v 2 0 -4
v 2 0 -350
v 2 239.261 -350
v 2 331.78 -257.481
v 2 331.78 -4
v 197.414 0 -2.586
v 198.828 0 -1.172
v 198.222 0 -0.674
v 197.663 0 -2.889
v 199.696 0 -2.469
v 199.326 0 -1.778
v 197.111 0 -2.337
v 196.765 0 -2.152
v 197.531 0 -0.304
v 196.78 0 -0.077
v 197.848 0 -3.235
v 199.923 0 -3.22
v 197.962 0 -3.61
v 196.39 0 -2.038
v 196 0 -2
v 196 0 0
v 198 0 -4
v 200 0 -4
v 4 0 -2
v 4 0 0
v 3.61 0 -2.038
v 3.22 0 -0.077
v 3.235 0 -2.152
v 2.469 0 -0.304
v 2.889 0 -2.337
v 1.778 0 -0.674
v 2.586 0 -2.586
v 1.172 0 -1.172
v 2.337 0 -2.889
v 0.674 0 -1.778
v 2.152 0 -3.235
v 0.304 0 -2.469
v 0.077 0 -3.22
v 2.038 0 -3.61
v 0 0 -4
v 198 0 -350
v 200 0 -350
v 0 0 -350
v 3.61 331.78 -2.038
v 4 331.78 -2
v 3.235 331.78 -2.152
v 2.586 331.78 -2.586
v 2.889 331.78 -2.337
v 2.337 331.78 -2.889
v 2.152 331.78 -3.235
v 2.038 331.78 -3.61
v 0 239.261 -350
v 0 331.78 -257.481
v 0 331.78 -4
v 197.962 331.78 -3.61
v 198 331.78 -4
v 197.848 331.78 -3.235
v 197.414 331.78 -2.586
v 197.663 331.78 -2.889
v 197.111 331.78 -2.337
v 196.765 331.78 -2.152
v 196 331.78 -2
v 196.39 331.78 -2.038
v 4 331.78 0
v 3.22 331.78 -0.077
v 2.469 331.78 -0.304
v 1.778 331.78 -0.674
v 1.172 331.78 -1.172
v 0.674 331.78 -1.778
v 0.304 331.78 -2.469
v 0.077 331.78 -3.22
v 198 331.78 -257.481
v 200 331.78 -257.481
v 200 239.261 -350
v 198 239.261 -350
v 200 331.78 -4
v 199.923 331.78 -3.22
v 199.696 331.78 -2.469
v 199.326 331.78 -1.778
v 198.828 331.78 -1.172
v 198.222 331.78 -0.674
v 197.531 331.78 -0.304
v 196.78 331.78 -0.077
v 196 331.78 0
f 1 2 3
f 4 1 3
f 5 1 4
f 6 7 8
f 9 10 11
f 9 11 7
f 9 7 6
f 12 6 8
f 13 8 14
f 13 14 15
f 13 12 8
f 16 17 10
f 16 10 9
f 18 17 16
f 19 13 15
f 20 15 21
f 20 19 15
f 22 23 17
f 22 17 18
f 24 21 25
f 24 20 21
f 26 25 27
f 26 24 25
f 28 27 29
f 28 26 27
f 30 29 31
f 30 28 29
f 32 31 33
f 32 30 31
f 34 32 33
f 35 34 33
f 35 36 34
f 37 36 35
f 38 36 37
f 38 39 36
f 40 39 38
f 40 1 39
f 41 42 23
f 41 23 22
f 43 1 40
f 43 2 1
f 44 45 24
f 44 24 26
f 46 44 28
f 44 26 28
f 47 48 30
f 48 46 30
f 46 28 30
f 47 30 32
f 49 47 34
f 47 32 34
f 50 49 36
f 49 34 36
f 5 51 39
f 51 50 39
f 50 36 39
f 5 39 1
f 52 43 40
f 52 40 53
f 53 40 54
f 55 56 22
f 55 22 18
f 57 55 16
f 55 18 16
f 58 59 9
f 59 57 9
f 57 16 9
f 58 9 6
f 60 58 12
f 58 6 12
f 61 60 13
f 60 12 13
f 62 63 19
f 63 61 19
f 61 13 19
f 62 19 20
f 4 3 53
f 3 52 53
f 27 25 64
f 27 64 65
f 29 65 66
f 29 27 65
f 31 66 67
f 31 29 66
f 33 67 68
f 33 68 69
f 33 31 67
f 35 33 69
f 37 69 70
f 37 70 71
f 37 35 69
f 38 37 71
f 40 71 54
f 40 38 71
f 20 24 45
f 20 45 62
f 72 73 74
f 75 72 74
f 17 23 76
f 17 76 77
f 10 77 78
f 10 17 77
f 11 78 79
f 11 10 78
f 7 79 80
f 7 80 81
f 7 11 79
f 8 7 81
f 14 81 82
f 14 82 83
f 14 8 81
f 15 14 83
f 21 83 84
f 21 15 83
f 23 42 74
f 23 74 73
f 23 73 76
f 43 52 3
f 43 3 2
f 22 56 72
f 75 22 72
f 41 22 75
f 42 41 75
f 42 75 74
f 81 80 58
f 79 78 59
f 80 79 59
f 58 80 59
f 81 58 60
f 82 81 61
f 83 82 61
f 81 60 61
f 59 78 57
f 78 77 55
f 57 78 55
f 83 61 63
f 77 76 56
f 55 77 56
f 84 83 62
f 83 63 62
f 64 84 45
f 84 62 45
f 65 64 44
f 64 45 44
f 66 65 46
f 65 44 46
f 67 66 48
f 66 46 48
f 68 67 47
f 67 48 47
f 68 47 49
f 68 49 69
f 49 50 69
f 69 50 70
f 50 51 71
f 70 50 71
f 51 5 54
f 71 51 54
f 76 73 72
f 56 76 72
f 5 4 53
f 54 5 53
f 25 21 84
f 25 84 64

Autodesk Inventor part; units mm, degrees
ref_plane "YZ Plane" through (0, 0, 0) normal (1, 0, 0) x (0, 1, 0)
ref_plane "XZ Plane" through (0, 0, 0) normal (0, 1, 0) x (-1, 0, 0)
ref_plane "XY Plane" through (0, 0, 0) normal (0, 0, 1) x (1, 0, 0)
sketch "Sketch1" plane through (0, 0, 0) normal (1, 0, 0) x (0, 1, 0)
  line L0 (0, 0) -> (331.78, 0)
  line L1 (331.78, 0) -> (331.78, -350)
  line L2 (331.78, -350) -> (0, -350)
  line L3 (0, -350) -> (0, 0)
  line L4 (239.261, -350) -> (331.78, -257.481)
  line L5 (120, -350) -> (115, -350)
  line L6 (115, -350) -> (115, -353)
  line L7 (115, -353) -> (120, -353)
  line L8 (120, -353) -> (120, -350)
  line L9 (115, -353) -> (130, -353)
  line L10 (130, -353) -> (130, -358)
  line L11 (130, -358) -> (115, -358)
  line L12 (115, -358) -> (115, -353)
  line L13 (90, -350) -> (95, -350)
  line L14 (95, -350) -> (95, -353)
  line L15 (95, -353) -> (90, -353)
  line L16 (90, -353) -> (90, -350)
  line L17 (90, -353) -> (105, -353)
  line L18 (105, -353) -> (105, -358)
  line L19 (105, -358) -> (90, -358)
  line L20 (90, -358) -> (90, -353)
  line L21 (60, -350) -> (65, -350)
  line L22 (65, -350) -> (65, -353)
  line L23 (65, -353) -> (60, -353)
  line L24 (60, -353) -> (60, -350)
  line L25 (60, -353) -> (75, -353)
  line L26 (75, -353) -> (75, -358)
  line L27 (75, -358) -> (60, -358)
  line L28 (60, -358) -> (60, -353)
  point P0 (117.5, -353)
  point P1 (115, -355.5)
  point P2 (130, -355.5)
  point P3 (95, -351.5)
  point P4 (90, -351.5)
  point P5 (90, -355.5)
  point P6 (60, -351.5)
  point P7 (65, -351.5)
  dimension "d0" = 350
  dimension "d1" = 331.78
  dimension "d2" = 239.261
  dimension "d3" = 45
  dimension "d27" = 3
  dimension "d28" = 5
  dimension "d29" = 5
  dimension "d30" = 15
  dimension "d31" = 115
  dimension "d32" = 5
  dimension "d33" = 15
  dimension "d34" = 5
  dimension "d35" = 25
  dimension "d36" = 15
  dimension "d37" = 5
  dimension "d38" = 65
extrude "Plate1" add sketch "Sketch1" along normal blind 2 contours L0 L1 L4 L2 L3 | L2 L22 L23 L24 | L23 L25 L26 L27 L28 | L8 L7 L6 L2 | L2 L14 L15 L16 | L9 L10 L11 L12 L7 | L15 L17 L18 L19 L20
sketch "Sketch2" plane through (0, 0, -2) normal (0, 0, 1) x (1, 0, 0)
  line L0 (0, 331.78) -> (0, 0)
  line L1 (0, 0) -> (200, 0)
  line L2 (200, 0) -> (200, 331.78)
  line L3 (200, 331.78) -> (0, 331.78)
edge flange "Flange1" height 200 angle 90 thickness 2 bend radius 2 thickness toward (0, 0, 1) relief tear relief width 2 relief depth 1 edges at (2, 165.89, 0) wall of the first edge with corners at (0, 331.78, -2) (0, 0, -2) (200, 0, -2) (200, 331.78, -2)
bend "Bend1"
corner "Corner1"
sketch "Sketch3" plane through (198, 0, 0) normal (1, 0, 0) x (0, 1, 0)
  line L0 (331.78, 0) -> (0, 0)
  line L1 (0, 0) -> (0, -350)
  line L2 (0, -350) -> (331.78, -350)
  line L3 (331.78, -350) -> (331.78, 0)
edge flange "Flange2" height 350 angle 90 thickness 2 bend radius 2 thickness toward (1, 0, 0) relief tear relief width 2 relief depth 1 edges at (200, 165.89, -2) wall of the first edge with corners at (198, 331.78, 0) (198, 0, 0) (198, 0, -350) (198, 331.78, -350)
bend "Bend2"
corner "Corner2"
sketch "Sketch4" plane through (200, 0, -350) normal (1, 0, 0) x (0, 0, -1)
  line L0 (-92.519, 331.78) -> (0, 239.261) projected
  line L1 (-346, 331.78) -> (0, 331.78) projected
  line L2 (0, 331.78) -> (0, 0) projected
  point P0 (-350, 0)
extrude "Cut1" cut sketch "Sketch4" against normal blind 2
sketch "Sketch5" plane through (200, 0, -4) normal (1, 0, 0) x (0, 0, -1)
  line L0 (0, 331.78) -> (0, 0)
  line L1 (346, 0) -> (0, 0)
  line L2 (346, 60) -> (346, 0)
  line L3 (354, 60) -> (346, 60)
  line L4 (354, 75) -> (354, 60)
  line L5 (349, 75) -> (354, 75)
  line L6 (349, 65) -> (349, 75)
  line L7 (346, 65) -> (349, 65)
  line L8 (346, 90) -> (346, 65)
  line L9 (354, 90) -> (346, 90)
  line L10 (354, 105) -> (354, 90)
  line L11 (349, 105) -> (354, 105)
  line L12 (349, 95) -> (349, 105)
  line L13 (346, 95) -> (349, 95)
  line L14 (346, 115) -> (346, 95)
  line L15 (354, 115) -> (346, 115)
  line L16 (354, 130) -> (354, 115)
  line L17 (349, 130) -> (354, 130)
  line L18 (349, 120) -> (349, 130)
  line L19 (346, 120) -> (349, 120)
  line L20 (346, 239.261) -> (346, 120)
  line L21 (253.481, 331.78) -> (346, 239.261)
  line L22 (0, 331.78) -> (253.481, 331.78)
  line L23 (346, 239.261) -> (253.481, 331.78)
  line L24 (0, 331.78) -> (253.481, 331.78)
  line L25 (0, 331.78) -> (0, 0)
  line L26 (346, 0) -> (0, 0)
  line L27 (346, 239.261) -> (346, 0)
  line L28 (346, 120) -> (354, 120)
  line L29 (354, 120) -> (354, 115)
  line L30 (354, 115) -> (346, 115)
  line L31 (346, 115) -> (346, 120)
  line L32 (354, 90) -> (346, 90)
  line L33 (346, 95) -> (354, 95)
  line L34 (354, 95) -> (354, 90)
  line L35 (354, 90) -> (346, 90)
  line L36 (346, 90) -> (346, 95)
  line L37 (346, 65) -> (354, 65)
  line L38 (354, 65) -> (354, 60)
  line L39 (354, 60) -> (346, 60)
  line L40 (346, 60) -> (346, 65)
  line L41 (354, 65) -> (349, 65)
  line L42 (349, 65) -> (349, 75)
  line L43 (349, 75) -> (354, 75)
  line L44 (354, 75) -> (354, 65)
  line L45 (354, 95) -> (349, 95)
  line L46 (349, 95) -> (349, 105)
  line L47 (349, 105) -> (354, 105)
  line L48 (354, 105) -> (354, 95)
  line L49 (354, 120) -> (349, 120)
  line L50 (349, 120) -> (349, 130)
  line L51 (349, 130) -> (354, 130)
  line L52 (354, 130) -> (354, 120)
  point P0 (-4, 0)
  point P1 (346, 65)
  point P2 (346, 60)
  point P3 (346, 95)
  point P4 (346, 90)
  point P5 (346, 120)
  point P6 (346, 115)
sheet face with bend "Face2" sketch "Sketch5" thickness 2 toward (-1, 0, 0) bend radius 2 contours L27 L7 L37 L4 L3 | L19 L28 L16 L15 L27 | L18 L17 L16 L28 | L37 L6 L5 L4 | L27 L13 L33 L10 L9 | L12 L11 L10 L33
bend "Bend3"
sketch "Sketch6" plane through (0, 0, 0) normal (-1, 0, 0) x (0, 0, 1)
  line L0 (-4, 0) -> (-4, 331.78) projected
  line L1 (-257.481, 331.78) -> (-4, 331.78) projected
  line L2 (-350, 239.261) -> (-257.481, 331.78) projected
  line L3 (-350, 120) -> (-350, 239.261) projected
  line L4 (-353, 120) -> (-350, 120) projected
  line L5 (-353, 130) -> (-353, 120) projected
  line L6 (-358, 130) -> (-353, 130) projected
  line L7 (-358, 115) -> (-358, 130) projected
  line L8 (-350, 115) -> (-358, 115) projected
  line L9 (-350, 95) -> (-350, 115) projected
  line L10 (-353, 95) -> (-350, 95) projected
  line L11 (-353, 105) -> (-353, 95) projected
  line L12 (-358, 105) -> (-353, 105) projected
  line L13 (-358, 90) -> (-358, 105) projected
  line L14 (-350, 90) -> (-358, 90) projected
  line L15 (-350, 65) -> (-350, 90) projected
  line L16 (-353, 65) -> (-350, 65) projected
  line L17 (-353, 75) -> (-353, 65) projected
  line L18 (-358, 75) -> (-353, 75) projected
  line L19 (-358, 60) -> (-358, 75) projected
  line L20 (-350, 60) -> (-358, 60) projected
  line L21 (-350, 0) -> (-350, 60) projected
  line L22 (-4, 0) -> (-350, 0) projected
  line L23 (-350, 60) -> (-350, 120)
  line L24 (-350, 120) -> (-353, 120)
  line L25 (-353, 130) -> (-358, 130)
  line L26 (-358, 60) -> (-350, 60)
  line L27 (-358, 60) -> (-358, 130)
  point P0 (0, 0)
extrude "Extrusion1" cut sketch "Sketch6" against normal through all contours L20 L19 L18 L17 L16 L23 | L23 L8 L7 L6 L5 L4 | L14 L13 L12 L11 L10 L23
equation "\"d33\" = d30"
equation "\"d34\" = d28"
equation "\"d36\" = d33"
equation "\"d25\" = Thickness"
equation "\"d4\" = Thickness"
equation "\"d5\" = BendReliefWidth"
equation "\"d6\" = BendReliefDepth"
equation "\"d7\" = MinimumRemnant"
equation "\"d8\" = TransitionRadius"
equation "\"d11\" = BendRadius"
equation "\"d12\" = CornerReliefSize"
equation "\"d13\" = GapSize"
equation "\"d14\" = JacobiRadiusSize"
equation "\"d15\" = BendReliefWidth"
equation "\"d16\" = BendReliefDepth"
equation "\"d17\" = MinimumRemnant"
equation "\"d18\" = TransitionRadius"
equation "\"d21\" = BendRadius"
equation "\"d22\" = CornerReliefSize"
equation "\"d23\" = GapSize"
equation "\"d24\" = JacobiRadiusSize"
equation "\"d39\" = BendRadius"
equation "\"d40\" = BendReliefWidth"
equation "\"d42\" = MinimumRemnant"
equation "\"d41\" = BendReliefDepth"
equation "\"d43\" = TransitionRadius"
equation "\"d37\" = d34"
equation "\"BendRadius\" = Thickness"
equation "\"BendReliefWidth\" = Thickness"
equation "\"BendReliefDepth\" = 0.5 * Thickness"
equation "\"CornerReliefSize\" = 4 * Thickness"
equation "\"MinimumRemnant\" = 2 * Thickness"
equation "\"TransitionRadius\" = BendRadius"
equation "\"JacobiRadiusSize\" = BendRadius"
equation "\"GapSize\" = Thickness"
equation "\"Thickness\" = 2"
properties part number "LzC-StoveCover" material "Steel"
